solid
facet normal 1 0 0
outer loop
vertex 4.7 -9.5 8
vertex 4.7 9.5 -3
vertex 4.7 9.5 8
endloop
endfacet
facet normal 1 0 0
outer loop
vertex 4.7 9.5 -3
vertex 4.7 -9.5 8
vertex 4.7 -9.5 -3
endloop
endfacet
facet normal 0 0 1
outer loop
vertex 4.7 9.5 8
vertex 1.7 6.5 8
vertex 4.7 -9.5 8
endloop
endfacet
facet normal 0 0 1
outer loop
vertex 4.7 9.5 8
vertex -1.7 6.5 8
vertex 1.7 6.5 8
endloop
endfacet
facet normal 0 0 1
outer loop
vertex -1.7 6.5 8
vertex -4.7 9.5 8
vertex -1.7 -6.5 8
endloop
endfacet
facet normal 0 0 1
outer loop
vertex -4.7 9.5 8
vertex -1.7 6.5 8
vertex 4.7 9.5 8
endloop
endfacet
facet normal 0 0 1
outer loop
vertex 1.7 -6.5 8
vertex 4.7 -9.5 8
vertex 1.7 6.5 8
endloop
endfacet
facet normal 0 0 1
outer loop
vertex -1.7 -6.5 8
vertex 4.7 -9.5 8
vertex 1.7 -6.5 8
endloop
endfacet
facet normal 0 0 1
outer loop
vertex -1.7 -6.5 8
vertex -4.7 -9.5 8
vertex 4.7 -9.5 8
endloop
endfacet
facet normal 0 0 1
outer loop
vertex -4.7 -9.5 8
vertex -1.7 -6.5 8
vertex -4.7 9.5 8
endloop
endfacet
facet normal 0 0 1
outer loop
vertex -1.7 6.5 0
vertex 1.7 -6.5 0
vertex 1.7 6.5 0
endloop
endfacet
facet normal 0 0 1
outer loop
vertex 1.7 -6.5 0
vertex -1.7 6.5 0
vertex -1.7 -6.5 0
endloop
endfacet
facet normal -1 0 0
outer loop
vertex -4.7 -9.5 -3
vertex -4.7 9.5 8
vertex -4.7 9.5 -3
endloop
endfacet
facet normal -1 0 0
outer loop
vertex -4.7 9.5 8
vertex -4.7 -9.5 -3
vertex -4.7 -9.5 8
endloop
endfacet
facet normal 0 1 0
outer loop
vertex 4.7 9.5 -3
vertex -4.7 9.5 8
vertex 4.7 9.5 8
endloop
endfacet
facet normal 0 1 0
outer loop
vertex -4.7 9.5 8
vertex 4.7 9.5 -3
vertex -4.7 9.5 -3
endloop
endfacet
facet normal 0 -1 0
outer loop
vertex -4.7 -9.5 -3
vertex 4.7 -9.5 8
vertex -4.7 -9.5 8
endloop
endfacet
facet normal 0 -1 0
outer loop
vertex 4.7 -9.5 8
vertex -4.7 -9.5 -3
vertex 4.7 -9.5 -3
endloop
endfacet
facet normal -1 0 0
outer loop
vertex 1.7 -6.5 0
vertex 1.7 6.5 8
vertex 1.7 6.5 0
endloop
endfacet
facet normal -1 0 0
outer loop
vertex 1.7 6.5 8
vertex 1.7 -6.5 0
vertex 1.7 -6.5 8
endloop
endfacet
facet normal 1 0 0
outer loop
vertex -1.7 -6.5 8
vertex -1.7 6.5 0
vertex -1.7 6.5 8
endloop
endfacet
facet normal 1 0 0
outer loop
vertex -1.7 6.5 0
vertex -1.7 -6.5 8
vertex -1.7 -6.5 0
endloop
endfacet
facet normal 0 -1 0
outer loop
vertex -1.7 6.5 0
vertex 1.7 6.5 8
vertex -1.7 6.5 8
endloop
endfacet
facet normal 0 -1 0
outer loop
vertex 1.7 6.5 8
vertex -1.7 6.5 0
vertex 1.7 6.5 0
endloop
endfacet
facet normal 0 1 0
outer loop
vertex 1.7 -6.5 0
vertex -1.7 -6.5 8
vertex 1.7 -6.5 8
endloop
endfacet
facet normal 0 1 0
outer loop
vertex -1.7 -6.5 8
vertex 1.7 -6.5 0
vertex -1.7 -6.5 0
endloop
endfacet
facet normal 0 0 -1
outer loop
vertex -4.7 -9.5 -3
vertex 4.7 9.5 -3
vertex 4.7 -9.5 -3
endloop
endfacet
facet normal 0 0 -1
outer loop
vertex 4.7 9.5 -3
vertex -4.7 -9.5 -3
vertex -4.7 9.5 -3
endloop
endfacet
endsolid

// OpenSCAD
// -----------------------------------------------------------
// Customizable Socket Organizers: Rectangular End Cap
// -----------------------------------------------------------
//
// Zemba Craftworks
// youtube.com/zembacraftworks
// thingiverse.com/zembacraftworks/about

// This is a configurable, 3D printable insert designed to
// slide onto a metal or wooden bar to create socket set
// organizers. Dimensions can be adjusted for sockets of
// all sizes and to slide onto bars/holders of any size.

// Date Created:  2018-08-15
// Last Modified: 2018-12-19

// Critical Dimensions
// -------------------
// Adjust these dimensions and verify them with a test print
// before printing holders for all of your sockets! You want a
// snug fit but not so tight that anything gets stuck. These
// values will vary depending on your sockets, the rail you're
// using, and the calibration of your printer.


rx = 3.4;           // Rail Cross-Section Thickness (mm)
ry = 13;            // Rail Cross-Section Width (mm)

ct = 3;             // Wall Thickness of End Cap (mm)
ch = 8;           // Height of End Cap (mm)

// Tolerance Value
// ---------------
// When shapes are subtracted through difference() in
// OpenSCAD, there is ambiguity if any faces of the two shapes
// occupy the same space. Adding a small value 't' to make
// the subtracted shape slightly larger prevents this.

t = 0.1;

union(){        
    // Rail Clamp
    difference(){
        // Rail Clamp
        translate([-(rx+2*ct)/2, -(ry+2*ct)/2, 0]){
            cube([rx + 2*ct, ry + 2*ct, ch]);    }    
        // Rail
        translate([-rx/2, -ry/2, 0]){
            cube([rx, ry, ch+t]);    }} 

    // Rail Cap
    translate([-(rx+2*ct)/2, -(ry+2*ct)/2, -ct]){
    cube([rx + 2*ct, ry + 2*ct, ct]);    }      
}
